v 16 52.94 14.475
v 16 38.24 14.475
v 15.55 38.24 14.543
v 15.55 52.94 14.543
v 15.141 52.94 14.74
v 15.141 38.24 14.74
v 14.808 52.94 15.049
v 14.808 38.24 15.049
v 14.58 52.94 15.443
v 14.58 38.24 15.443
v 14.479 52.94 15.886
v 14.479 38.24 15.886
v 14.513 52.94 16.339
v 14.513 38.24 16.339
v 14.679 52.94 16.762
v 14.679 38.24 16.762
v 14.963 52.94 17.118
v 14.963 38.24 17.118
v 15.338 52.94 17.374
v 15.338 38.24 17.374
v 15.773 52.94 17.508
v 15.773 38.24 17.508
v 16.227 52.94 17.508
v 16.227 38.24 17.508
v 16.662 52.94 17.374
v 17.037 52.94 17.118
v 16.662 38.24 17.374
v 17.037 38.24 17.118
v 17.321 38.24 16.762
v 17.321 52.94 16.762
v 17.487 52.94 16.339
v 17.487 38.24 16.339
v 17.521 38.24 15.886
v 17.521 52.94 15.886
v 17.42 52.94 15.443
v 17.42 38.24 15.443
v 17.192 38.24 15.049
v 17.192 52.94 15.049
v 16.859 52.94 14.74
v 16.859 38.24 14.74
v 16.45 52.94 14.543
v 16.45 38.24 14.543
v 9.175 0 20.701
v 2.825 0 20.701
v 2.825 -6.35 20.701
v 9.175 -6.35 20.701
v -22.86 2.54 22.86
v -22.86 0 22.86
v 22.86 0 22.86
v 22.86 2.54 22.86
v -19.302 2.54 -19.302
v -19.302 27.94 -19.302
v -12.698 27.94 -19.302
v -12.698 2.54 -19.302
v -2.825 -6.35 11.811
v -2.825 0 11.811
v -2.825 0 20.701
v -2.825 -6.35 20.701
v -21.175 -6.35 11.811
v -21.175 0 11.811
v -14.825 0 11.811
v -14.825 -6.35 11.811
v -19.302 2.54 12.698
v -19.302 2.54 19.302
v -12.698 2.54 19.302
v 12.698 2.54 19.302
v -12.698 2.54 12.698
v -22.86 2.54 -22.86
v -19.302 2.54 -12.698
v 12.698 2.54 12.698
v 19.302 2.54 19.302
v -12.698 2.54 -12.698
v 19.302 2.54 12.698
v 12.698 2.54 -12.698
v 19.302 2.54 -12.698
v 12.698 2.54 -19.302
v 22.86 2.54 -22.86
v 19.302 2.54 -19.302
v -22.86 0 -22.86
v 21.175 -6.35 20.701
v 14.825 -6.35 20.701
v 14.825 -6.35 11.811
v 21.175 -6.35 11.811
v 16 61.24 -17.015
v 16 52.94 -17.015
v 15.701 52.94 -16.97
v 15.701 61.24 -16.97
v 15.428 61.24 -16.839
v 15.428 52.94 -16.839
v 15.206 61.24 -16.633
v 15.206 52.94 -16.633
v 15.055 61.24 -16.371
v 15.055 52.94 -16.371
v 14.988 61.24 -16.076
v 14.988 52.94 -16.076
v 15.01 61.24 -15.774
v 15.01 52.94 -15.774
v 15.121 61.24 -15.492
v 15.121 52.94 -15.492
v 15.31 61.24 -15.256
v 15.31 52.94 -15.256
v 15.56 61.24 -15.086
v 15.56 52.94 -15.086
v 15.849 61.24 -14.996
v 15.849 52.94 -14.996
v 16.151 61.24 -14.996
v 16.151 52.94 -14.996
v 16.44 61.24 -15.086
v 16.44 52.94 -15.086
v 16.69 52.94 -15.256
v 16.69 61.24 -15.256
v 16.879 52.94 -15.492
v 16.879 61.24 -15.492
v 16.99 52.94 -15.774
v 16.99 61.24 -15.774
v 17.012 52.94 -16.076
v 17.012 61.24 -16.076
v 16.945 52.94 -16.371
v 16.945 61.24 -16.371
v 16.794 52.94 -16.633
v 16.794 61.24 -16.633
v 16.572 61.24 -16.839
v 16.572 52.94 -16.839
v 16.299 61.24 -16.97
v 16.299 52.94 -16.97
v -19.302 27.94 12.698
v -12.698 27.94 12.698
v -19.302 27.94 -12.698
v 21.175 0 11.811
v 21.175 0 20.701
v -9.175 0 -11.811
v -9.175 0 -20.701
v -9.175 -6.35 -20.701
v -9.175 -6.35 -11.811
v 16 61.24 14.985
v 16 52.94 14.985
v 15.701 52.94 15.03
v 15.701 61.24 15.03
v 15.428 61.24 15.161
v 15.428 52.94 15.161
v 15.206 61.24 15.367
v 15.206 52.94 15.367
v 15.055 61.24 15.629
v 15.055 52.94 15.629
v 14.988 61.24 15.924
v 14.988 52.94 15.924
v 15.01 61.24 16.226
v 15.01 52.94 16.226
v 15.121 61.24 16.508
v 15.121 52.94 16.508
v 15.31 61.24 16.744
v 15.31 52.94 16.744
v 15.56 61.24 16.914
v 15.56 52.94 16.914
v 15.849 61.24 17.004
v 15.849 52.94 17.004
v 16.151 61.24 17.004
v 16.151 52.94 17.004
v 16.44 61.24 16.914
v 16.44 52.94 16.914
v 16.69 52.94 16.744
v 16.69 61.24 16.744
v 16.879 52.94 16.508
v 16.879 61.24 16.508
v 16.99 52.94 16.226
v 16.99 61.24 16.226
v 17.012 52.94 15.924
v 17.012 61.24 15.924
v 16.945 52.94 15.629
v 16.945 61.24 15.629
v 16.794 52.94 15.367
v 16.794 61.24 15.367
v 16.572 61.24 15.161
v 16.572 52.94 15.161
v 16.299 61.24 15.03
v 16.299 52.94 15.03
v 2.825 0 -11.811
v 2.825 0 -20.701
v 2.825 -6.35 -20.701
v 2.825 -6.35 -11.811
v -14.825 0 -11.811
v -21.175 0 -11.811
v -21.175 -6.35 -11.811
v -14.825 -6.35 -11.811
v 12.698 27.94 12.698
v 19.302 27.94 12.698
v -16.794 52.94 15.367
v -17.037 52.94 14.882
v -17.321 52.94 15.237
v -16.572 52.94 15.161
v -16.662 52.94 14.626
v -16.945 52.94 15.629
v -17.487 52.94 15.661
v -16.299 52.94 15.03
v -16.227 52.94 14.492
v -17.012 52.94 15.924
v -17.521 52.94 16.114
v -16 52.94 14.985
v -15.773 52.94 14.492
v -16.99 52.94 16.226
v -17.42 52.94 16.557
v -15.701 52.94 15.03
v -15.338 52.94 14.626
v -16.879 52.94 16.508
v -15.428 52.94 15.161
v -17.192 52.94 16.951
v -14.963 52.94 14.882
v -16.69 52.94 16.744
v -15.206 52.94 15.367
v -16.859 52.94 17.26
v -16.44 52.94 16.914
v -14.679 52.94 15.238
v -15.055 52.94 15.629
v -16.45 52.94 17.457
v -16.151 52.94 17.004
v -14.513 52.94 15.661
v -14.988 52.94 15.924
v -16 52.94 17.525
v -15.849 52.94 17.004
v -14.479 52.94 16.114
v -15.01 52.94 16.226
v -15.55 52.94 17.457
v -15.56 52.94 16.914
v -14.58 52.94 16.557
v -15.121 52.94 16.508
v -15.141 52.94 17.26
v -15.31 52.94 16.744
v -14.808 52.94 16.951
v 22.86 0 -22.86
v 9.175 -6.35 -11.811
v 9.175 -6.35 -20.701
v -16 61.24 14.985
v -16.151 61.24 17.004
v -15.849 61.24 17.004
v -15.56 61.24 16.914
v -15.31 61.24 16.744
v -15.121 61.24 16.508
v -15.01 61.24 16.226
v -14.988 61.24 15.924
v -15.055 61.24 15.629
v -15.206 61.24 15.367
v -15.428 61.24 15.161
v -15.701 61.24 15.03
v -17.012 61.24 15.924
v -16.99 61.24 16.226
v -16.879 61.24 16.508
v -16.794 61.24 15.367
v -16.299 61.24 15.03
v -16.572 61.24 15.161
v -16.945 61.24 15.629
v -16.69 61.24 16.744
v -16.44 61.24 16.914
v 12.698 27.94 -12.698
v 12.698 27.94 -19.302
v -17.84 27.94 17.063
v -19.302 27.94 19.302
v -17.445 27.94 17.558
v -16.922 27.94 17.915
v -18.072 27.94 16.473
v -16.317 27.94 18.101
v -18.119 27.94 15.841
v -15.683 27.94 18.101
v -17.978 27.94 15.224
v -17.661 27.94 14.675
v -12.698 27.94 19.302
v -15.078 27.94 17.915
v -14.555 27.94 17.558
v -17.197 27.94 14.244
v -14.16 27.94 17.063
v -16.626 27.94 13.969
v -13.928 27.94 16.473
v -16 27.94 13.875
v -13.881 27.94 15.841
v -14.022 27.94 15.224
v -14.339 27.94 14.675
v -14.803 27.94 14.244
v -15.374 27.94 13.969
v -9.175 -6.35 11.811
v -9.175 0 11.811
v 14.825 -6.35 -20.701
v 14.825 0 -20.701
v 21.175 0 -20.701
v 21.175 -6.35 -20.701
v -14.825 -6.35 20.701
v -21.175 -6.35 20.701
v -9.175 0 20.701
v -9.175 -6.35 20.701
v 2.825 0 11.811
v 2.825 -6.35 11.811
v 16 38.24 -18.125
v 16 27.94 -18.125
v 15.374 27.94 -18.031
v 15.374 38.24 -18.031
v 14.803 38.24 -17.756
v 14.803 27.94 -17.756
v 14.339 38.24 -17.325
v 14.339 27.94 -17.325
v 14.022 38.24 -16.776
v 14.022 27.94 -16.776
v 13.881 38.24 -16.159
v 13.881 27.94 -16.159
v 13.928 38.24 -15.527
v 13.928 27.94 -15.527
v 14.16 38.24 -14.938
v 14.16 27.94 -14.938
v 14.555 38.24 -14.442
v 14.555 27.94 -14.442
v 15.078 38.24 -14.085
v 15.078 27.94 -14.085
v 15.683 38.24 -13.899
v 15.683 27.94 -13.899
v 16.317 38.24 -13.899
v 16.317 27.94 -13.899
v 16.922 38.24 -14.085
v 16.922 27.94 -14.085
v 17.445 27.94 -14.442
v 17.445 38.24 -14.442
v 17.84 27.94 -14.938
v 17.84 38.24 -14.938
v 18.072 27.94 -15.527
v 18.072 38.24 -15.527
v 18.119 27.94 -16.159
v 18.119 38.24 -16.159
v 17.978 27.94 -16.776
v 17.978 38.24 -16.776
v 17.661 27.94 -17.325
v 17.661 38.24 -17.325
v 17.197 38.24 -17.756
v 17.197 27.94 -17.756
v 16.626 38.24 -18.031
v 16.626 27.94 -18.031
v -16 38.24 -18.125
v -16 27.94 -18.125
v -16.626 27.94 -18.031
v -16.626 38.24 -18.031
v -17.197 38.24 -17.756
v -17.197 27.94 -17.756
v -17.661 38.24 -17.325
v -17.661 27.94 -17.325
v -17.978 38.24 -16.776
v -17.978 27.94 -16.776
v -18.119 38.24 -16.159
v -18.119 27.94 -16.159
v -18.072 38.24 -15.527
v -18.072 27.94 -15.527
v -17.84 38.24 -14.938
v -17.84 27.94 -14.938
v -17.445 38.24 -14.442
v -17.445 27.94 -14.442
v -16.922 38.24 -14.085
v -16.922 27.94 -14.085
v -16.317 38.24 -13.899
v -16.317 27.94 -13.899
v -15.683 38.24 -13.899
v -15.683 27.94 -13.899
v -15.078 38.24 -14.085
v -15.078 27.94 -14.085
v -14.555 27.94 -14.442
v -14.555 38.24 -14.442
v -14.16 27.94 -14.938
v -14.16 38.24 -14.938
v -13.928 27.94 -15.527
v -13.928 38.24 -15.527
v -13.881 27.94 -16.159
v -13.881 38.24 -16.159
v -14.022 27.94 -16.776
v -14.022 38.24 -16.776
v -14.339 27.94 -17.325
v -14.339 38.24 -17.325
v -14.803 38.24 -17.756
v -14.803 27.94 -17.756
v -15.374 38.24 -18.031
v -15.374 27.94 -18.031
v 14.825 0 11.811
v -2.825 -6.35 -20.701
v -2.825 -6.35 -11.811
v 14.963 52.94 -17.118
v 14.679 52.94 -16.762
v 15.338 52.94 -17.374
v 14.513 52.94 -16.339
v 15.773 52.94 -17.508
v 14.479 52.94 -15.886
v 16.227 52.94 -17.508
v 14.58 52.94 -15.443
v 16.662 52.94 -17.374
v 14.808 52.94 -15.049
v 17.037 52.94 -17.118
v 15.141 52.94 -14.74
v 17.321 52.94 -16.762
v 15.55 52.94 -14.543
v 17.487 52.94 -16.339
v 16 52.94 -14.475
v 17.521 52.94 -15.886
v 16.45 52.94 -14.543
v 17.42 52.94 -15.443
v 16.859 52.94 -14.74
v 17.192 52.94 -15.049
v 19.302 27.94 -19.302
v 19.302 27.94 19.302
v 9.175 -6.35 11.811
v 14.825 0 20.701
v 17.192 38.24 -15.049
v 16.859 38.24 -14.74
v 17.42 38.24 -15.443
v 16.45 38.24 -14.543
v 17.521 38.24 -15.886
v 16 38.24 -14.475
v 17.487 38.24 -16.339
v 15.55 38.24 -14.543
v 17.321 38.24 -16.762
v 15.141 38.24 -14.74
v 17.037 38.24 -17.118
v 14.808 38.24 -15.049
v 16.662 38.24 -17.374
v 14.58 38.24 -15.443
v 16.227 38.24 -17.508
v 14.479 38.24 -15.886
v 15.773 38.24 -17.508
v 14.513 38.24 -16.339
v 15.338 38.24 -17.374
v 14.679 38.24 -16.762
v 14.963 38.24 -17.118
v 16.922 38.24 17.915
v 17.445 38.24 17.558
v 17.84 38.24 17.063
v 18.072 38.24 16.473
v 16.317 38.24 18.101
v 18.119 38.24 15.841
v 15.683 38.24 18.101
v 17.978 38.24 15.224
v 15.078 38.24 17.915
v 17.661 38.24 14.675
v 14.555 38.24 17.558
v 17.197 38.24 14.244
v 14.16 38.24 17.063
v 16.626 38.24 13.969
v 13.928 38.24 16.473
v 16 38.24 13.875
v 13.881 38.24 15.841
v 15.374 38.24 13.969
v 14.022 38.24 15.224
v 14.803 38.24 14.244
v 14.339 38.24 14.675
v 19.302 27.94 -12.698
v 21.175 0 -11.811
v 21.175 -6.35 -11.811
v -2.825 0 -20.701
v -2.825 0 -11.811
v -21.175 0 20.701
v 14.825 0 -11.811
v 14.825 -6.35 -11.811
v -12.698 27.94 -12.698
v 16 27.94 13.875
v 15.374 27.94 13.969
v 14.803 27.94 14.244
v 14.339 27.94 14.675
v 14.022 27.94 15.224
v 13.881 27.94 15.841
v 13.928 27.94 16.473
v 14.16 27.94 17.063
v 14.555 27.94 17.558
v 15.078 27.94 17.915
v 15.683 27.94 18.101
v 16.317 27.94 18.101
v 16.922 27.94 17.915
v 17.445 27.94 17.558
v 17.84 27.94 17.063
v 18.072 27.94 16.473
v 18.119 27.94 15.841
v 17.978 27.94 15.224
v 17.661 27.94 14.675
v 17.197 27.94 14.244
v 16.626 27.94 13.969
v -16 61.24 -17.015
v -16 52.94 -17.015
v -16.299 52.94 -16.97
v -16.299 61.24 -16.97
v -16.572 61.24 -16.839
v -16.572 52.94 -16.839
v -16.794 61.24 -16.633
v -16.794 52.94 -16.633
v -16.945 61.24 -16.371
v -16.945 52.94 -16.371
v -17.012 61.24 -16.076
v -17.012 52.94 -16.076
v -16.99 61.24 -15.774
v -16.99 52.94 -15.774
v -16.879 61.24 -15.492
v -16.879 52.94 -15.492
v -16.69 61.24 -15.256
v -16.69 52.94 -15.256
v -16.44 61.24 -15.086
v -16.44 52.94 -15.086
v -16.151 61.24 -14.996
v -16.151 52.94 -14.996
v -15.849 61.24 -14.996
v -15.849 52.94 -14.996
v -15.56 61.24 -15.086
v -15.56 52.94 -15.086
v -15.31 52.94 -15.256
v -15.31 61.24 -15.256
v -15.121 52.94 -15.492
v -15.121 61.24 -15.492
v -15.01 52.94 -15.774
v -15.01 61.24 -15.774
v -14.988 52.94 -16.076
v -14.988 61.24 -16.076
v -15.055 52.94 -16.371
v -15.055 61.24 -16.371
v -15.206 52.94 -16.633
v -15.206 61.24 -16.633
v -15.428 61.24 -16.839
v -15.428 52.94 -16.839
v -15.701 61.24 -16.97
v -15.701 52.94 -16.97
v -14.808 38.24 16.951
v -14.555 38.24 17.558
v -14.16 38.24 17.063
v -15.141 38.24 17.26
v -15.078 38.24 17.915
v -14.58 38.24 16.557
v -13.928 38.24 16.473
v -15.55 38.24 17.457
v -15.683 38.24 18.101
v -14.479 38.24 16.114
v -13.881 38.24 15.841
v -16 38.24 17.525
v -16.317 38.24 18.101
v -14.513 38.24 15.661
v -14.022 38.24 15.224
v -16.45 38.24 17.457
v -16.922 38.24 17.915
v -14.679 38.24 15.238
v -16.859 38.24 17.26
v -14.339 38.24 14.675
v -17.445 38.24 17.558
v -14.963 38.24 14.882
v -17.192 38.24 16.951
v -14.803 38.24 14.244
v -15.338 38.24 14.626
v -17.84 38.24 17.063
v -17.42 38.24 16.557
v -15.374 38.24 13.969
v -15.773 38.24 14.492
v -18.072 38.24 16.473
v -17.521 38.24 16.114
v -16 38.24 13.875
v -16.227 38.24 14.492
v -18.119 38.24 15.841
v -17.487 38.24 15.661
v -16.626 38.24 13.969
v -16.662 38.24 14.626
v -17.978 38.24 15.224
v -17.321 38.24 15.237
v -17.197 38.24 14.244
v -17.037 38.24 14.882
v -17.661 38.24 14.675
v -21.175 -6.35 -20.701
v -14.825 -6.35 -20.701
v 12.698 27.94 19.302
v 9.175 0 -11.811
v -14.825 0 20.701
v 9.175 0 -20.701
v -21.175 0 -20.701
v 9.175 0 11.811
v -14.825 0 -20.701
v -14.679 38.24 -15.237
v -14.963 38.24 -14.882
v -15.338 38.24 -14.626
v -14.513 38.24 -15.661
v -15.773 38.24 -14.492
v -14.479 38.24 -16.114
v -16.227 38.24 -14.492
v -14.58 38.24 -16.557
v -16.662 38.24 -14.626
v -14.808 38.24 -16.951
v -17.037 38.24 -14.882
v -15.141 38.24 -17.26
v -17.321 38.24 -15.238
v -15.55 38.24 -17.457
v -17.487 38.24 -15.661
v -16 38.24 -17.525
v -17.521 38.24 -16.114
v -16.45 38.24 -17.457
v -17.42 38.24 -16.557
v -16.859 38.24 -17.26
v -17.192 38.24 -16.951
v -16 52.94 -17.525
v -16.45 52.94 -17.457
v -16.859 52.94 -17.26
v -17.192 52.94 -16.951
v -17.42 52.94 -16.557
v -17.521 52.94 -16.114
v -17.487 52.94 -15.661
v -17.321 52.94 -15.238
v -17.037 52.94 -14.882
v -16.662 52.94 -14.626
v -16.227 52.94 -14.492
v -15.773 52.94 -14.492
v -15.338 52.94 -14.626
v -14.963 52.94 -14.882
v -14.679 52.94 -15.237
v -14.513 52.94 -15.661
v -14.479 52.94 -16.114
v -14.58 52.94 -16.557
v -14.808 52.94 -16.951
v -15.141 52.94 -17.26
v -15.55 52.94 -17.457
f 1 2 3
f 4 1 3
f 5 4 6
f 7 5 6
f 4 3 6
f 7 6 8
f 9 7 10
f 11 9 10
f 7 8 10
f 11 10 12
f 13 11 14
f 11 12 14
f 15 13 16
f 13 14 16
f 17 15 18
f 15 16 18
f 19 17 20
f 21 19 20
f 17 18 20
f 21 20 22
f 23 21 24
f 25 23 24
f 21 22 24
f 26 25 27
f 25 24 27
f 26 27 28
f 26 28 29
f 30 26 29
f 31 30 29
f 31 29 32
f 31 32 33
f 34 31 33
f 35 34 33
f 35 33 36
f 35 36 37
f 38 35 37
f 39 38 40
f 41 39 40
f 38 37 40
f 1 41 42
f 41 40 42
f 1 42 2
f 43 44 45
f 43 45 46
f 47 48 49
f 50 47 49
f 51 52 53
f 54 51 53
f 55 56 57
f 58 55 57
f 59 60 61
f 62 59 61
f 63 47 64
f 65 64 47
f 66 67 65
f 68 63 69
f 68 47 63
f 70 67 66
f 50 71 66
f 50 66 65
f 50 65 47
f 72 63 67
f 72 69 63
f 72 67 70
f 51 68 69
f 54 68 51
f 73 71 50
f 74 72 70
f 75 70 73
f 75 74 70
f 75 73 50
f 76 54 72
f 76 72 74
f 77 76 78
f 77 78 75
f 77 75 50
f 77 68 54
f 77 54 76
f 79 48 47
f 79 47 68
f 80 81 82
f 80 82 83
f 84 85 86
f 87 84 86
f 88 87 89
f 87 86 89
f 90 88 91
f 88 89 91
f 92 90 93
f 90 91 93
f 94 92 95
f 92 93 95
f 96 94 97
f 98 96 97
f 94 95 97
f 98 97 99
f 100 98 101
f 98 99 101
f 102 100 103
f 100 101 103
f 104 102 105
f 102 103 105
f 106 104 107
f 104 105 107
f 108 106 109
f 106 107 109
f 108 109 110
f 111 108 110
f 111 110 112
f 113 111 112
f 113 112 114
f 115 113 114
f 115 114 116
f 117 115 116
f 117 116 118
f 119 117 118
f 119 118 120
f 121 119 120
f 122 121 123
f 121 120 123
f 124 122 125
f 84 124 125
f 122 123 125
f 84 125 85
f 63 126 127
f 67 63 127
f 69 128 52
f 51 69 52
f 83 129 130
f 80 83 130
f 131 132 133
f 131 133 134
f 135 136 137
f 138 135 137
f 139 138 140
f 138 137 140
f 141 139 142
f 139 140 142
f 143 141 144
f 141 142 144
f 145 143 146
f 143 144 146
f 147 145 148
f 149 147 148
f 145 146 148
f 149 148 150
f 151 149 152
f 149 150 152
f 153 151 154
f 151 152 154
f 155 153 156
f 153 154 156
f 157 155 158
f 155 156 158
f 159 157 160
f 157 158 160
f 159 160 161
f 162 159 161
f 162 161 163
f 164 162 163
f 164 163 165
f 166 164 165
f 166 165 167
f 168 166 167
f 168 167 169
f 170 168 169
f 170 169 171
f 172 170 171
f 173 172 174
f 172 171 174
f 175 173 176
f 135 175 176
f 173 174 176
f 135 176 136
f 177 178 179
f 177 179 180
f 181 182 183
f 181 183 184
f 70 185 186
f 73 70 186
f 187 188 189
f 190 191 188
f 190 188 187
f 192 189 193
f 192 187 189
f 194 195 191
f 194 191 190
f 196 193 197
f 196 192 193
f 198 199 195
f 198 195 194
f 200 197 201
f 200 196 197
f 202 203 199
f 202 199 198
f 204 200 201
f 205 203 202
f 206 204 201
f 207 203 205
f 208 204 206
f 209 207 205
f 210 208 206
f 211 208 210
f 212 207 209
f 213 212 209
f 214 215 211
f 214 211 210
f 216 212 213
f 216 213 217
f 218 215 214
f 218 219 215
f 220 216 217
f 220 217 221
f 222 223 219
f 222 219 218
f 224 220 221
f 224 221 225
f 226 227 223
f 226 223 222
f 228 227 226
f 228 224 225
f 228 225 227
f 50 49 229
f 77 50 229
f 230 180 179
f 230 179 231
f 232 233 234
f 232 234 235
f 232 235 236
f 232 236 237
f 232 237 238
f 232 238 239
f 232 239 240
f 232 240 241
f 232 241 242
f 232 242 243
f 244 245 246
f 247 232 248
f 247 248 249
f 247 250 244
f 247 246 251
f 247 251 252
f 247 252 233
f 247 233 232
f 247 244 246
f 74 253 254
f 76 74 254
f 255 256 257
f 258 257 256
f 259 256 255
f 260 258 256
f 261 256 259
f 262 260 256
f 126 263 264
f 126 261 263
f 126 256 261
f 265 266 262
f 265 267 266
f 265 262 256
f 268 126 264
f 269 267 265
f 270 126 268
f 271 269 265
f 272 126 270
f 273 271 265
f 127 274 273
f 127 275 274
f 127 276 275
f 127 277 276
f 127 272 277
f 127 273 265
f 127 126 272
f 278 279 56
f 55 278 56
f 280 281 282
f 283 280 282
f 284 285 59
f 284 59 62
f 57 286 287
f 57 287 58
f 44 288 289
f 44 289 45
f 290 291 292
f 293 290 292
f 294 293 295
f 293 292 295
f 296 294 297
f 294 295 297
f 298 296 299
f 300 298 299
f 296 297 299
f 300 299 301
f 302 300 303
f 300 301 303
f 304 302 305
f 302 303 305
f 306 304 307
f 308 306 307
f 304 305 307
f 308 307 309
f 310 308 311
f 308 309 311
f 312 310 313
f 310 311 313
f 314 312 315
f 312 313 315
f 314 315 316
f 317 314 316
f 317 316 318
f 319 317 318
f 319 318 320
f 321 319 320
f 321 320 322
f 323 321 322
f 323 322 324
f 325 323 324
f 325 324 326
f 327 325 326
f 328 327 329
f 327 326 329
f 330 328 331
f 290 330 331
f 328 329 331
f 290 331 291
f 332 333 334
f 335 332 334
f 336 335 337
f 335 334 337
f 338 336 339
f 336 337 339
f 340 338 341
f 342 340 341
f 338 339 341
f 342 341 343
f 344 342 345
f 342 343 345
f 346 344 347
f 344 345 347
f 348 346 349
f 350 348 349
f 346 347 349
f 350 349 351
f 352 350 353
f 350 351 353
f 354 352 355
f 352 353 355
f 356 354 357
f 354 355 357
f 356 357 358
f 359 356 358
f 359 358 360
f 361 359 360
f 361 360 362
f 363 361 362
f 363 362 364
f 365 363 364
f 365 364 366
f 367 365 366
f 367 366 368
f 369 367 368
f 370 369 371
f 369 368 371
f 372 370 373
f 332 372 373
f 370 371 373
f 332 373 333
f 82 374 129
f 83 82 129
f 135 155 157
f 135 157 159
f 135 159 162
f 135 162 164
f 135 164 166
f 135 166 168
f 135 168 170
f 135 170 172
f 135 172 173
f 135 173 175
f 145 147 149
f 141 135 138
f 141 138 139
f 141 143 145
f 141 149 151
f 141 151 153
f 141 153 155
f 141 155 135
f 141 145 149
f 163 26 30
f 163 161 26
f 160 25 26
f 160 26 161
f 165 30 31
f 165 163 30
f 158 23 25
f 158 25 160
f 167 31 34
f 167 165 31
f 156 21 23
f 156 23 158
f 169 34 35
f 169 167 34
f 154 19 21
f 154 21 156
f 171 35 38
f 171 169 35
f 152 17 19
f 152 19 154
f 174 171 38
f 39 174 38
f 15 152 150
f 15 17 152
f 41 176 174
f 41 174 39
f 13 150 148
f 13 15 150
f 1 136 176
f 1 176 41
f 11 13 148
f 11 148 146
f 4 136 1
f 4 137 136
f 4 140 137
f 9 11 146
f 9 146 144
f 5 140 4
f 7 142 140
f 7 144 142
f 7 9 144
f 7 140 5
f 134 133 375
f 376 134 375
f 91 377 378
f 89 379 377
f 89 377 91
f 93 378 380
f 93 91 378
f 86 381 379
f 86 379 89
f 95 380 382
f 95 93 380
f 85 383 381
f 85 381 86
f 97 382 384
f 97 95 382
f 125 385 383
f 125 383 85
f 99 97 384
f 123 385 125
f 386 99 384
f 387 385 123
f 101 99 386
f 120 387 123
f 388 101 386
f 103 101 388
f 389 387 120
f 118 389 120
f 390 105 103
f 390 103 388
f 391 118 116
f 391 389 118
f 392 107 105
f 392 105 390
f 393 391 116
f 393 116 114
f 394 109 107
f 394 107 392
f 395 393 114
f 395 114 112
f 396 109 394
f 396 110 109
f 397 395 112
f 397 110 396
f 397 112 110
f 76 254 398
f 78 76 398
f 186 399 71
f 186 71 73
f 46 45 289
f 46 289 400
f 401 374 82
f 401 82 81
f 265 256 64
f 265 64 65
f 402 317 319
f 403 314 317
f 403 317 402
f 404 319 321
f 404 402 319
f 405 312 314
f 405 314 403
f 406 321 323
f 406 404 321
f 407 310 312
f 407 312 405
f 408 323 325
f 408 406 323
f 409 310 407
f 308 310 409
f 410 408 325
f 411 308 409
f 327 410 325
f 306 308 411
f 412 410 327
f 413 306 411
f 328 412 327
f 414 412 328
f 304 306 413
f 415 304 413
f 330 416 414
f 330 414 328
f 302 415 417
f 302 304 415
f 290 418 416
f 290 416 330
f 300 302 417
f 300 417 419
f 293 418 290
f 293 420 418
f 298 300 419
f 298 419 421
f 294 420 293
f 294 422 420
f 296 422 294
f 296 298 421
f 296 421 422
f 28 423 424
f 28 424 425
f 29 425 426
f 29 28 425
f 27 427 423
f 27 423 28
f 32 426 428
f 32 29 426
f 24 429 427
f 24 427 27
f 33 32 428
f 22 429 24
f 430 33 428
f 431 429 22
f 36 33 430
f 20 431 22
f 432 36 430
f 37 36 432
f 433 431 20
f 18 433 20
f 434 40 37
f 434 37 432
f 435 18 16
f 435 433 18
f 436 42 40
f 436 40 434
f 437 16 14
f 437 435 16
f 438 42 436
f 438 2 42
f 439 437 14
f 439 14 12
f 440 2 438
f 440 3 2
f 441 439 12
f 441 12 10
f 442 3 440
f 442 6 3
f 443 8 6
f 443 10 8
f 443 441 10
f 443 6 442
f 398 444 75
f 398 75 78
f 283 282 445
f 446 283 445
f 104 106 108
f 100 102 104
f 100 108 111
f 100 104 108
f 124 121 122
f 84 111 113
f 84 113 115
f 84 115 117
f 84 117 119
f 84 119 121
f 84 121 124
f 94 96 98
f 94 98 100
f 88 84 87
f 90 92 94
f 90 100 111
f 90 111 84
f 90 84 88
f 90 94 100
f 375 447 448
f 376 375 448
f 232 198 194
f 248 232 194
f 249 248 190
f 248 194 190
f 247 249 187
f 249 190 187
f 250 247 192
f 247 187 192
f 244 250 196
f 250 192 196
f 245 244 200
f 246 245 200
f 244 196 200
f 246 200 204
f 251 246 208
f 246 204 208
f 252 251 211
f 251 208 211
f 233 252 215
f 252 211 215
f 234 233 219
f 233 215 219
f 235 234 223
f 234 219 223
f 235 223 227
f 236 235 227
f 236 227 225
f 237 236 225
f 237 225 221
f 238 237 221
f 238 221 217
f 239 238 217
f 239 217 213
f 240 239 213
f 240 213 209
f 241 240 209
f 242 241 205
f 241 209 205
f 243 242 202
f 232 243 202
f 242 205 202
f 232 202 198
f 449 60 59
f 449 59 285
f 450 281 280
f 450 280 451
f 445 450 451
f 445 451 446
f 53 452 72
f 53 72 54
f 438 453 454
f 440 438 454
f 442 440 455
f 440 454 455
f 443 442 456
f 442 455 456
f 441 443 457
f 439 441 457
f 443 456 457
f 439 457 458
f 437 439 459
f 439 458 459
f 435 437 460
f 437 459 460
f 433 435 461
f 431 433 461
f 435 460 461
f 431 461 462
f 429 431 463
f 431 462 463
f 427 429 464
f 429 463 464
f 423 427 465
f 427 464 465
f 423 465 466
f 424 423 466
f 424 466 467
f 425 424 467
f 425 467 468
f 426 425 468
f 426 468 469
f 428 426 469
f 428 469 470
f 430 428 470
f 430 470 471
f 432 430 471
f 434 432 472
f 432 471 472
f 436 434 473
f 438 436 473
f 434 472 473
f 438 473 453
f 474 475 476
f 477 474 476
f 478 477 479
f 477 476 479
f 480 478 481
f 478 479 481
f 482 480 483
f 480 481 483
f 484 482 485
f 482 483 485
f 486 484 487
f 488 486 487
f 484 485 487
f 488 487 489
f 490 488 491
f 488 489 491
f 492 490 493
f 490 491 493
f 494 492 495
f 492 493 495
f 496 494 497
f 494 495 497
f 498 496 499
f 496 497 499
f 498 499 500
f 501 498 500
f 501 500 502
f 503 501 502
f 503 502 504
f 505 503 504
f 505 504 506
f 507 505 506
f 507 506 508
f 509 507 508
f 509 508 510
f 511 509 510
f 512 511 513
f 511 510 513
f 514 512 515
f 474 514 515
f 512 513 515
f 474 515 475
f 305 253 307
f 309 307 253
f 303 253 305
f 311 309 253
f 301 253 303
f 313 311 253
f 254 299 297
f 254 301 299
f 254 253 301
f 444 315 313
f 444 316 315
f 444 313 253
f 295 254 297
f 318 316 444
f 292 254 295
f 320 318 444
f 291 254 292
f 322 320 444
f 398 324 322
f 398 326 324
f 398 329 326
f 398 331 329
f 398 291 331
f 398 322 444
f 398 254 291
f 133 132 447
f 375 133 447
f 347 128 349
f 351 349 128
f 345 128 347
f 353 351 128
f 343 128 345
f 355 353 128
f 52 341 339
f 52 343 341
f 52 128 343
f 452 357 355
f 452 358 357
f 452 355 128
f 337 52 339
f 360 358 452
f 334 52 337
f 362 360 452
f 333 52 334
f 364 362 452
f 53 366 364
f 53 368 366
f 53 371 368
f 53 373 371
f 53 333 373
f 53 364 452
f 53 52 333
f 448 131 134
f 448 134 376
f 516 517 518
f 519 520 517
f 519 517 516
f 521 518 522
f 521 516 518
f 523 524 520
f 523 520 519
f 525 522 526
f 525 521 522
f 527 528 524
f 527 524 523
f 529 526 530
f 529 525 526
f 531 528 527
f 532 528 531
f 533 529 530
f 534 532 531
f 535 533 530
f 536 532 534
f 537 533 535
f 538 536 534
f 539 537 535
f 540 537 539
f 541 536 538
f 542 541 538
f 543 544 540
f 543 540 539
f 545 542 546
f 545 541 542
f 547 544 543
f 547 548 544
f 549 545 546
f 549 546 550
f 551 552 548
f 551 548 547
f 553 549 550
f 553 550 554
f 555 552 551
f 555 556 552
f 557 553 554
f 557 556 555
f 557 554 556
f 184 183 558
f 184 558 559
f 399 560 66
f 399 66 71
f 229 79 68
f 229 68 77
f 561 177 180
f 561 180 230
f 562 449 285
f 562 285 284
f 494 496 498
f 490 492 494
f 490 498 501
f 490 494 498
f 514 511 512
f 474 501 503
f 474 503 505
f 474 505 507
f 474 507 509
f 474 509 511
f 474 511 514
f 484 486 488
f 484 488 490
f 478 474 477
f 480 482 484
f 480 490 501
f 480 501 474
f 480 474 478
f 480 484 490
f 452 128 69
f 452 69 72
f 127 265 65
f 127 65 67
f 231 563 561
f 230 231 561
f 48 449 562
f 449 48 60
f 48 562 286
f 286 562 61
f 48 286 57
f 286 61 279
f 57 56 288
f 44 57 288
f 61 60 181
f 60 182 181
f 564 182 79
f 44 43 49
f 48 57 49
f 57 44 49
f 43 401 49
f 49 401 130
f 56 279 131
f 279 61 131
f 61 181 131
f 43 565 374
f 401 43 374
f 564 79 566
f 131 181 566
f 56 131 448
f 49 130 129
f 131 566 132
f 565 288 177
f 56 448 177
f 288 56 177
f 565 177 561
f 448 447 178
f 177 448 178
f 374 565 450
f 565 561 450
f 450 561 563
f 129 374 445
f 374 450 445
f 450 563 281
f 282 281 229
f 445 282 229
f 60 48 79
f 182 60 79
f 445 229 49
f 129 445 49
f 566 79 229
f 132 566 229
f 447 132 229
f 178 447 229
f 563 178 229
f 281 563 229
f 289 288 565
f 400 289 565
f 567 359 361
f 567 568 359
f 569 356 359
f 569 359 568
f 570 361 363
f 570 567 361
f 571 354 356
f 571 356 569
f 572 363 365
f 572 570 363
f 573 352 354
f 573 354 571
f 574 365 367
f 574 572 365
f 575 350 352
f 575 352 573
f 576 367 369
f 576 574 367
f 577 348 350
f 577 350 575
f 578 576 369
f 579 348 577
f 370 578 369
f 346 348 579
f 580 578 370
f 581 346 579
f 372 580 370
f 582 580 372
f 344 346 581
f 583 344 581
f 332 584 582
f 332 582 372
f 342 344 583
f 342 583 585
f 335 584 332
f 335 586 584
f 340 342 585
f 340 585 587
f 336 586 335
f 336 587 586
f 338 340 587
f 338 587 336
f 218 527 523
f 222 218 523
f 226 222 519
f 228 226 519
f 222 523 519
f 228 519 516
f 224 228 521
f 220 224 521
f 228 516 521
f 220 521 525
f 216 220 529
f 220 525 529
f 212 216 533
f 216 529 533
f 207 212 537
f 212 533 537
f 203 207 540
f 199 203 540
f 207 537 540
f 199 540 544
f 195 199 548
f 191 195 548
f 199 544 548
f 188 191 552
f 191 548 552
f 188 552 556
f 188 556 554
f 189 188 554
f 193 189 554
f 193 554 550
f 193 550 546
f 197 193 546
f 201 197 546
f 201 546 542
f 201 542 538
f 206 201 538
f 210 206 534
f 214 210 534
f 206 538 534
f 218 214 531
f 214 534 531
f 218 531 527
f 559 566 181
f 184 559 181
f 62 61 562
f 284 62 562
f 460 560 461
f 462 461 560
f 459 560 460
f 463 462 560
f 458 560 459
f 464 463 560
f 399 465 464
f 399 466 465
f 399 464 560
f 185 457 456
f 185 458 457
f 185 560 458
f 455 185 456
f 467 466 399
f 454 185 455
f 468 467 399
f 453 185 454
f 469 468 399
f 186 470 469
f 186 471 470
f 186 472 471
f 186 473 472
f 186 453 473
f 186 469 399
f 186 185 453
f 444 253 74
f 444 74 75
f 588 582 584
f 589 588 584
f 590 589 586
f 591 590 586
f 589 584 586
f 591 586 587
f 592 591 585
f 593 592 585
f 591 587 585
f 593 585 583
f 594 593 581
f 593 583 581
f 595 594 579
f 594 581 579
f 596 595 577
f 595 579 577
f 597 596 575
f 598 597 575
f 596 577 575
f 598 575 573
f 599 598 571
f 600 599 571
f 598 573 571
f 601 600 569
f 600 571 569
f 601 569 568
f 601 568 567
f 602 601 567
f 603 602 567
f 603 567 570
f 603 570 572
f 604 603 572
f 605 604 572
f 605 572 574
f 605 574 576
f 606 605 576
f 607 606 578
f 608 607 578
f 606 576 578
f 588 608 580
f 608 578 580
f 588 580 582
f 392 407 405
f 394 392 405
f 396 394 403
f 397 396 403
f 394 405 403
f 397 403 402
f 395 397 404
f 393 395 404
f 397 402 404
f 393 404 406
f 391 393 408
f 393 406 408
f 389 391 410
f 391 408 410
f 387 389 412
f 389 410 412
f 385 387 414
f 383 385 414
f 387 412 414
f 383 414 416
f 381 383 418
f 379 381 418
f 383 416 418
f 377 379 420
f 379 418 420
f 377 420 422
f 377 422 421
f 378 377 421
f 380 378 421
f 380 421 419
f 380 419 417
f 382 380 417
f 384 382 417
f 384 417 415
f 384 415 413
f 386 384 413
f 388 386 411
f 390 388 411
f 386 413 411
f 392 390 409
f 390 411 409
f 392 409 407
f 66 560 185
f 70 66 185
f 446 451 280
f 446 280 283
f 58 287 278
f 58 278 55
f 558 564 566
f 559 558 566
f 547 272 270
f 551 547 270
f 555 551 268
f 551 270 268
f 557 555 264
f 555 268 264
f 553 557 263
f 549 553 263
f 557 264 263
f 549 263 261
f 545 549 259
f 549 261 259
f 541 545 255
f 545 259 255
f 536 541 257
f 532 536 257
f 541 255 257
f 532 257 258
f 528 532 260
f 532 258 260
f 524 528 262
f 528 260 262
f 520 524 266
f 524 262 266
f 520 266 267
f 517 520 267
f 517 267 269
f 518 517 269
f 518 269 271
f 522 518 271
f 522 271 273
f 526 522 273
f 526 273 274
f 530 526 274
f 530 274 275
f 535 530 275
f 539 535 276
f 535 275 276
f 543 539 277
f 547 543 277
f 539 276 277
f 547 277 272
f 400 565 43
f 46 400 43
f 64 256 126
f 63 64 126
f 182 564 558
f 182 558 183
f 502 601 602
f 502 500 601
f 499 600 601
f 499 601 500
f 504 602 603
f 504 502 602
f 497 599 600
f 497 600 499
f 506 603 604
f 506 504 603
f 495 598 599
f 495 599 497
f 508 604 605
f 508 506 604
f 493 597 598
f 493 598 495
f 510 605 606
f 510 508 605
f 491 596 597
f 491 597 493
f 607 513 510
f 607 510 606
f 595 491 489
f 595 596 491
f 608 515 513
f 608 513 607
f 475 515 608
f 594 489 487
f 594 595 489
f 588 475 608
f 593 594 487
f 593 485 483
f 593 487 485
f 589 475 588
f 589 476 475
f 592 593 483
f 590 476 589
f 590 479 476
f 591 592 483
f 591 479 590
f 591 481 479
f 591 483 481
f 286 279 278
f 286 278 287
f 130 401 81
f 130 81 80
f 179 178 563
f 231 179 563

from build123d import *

# Parameters (mm, degrees)
SKETCH1_W           = 45.72
SKETCH1_H           = 45.72
BOSS_EXTRUDE1_DEPTH = 2.54
SKETCH2_W           = 6.604
SKETCH2_H           = 6.604
BOSS_EXTRUDE2_DEPTH = 25.4
SKETCH5_R           = 2.125
BOSS_EXTRUDE5_DEPTH = 10.3
SKETCH8_R           = 1.525
BOSS_EXTRUDE8_DEPTH = 14.7
SKETCH9_R           = 1.015
BOSS_EXTRUDE9_DEPTH = 8.3
SKETCH7_W           = 6.35
SKETCH7_H           = 8.89
BOSS_EXTRUDE7_DEPTH = 6.35


with BuildPart() as part:
    # Sketch1 → Boss-Extrude1 (new body)
    with BuildSketch(Plane(origin=(0, 0, 0), x_dir=(1, 0, 0), z_dir=(0, 1, 0))):
        Rectangle(SKETCH1_W, SKETCH1_H)
    extrude(amount=BOSS_EXTRUDE1_DEPTH)

    # Sketch2 → Boss-Extrude2 (add)
    with BuildSketch(Plane(origin=(0, 2.54, 0), x_dir=(1, 0, 0), z_dir=(0, 1, 0))):
        with Locations((16.000000004, 16.000000004)):
            Rectangle(SKETCH2_W, SKETCH2_H)
        with Locations((-16.000000004, 16.000000004)):
            Rectangle(SKETCH2_W, SKETCH2_H)
        with Locations((-16.000000004, -16.000000004)):
            Rectangle(SKETCH2_W, SKETCH2_H)
        with Locations((16.000000004, -16.000000004)):
            Rectangle(SKETCH2_W, SKETCH2_H)
    extrude(amount=BOSS_EXTRUDE2_DEPTH)

    # Sketch5 → Boss-Extrude5 (add)
    with BuildSketch(Plane(origin=(0, 27.94, 0), x_dir=(1, 0, 0), z_dir=(0, 1, 0))):
        with Locations(Location((-16.000000004, 16.000000004, 0), (0, 0, 90))):
            Circle(SKETCH5_R)
        with Locations(Location((16.000000004, 16.000000004, 0), (0, 0, 90))):
            Circle(SKETCH5_R)
        with Locations(Location((-16.000000004, -16.000000004, 0), (0, 0, 90))):
            Circle(SKETCH5_R)
        with Locations(Location((16.000000004, -16.000000004, 0), (0, 0, 90))):
            Circle(SKETCH5_R)
    extrude(amount=BOSS_EXTRUDE5_DEPTH)

    # Sketch8 → Boss-Extrude8 (add)
    with BuildSketch(Plane(origin=(0, 38.24, 0), x_dir=(1, 0, 0), z_dir=(0, 1, 0))):
        with Locations(Location((16, 16, 0), (0, 0, 270))):
            Circle(SKETCH8_R)
        with Locations(Location((-16, 16, 0), (0, 0, 90))):
            Circle(SKETCH8_R)
        with Locations(Location((-16, -16, 0), (0, 0, 270))):
            Circle(SKETCH8_R)
        with Locations(Location((16, -16, 0), (0, 0, 90))):
            Circle(SKETCH8_R)
    extrude(amount=BOSS_EXTRUDE8_DEPTH)

    # Sketch9 → Boss-Extrude9 (add)
    with BuildSketch(Plane(origin=(0, 52.94, 0), x_dir=(1, 0, 0), z_dir=(0, 1, 0))):
        with Locations(Location((16, 16, 0), (0, 0, 90))):
            Circle(SKETCH9_R)
        with Locations(Location((-16, 16, 0), (0, 0, 90))):
            Circle(SKETCH9_R)
        with Locations(Location((-16, -16, 0), (0, 0, 90))):
            Circle(SKETCH9_R)
        with Locations(Location((16, -16, 0), (0, 0, 90))):
            Circle(SKETCH9_R)
    extrude(amount=BOSS_EXTRUDE9_DEPTH)

    # Sketch7 → Boss-Extrude7 (add)
    with BuildSketch(Plane.XZ):
        with Locations((-6, 16.256)):
            Rectangle(SKETCH7_W, SKETCH7_H)
        with Locations((-18, 16.256)):
            Rectangle(SKETCH7_W, SKETCH7_H)
        with Locations((6, 16.256)):
            Rectangle(SKETCH7_W, SKETCH7_H)
        with Locations((18, 16.256)):
            Rectangle(SKETCH7_W, SKETCH7_H)
        with Locations((-6, -16.256)):
            Rectangle(SKETCH7_W, SKETCH7_H)
        with Locations((-18, -16.256)):
            Rectangle(SKETCH7_W, SKETCH7_H)
        with Locations((18, -16.256)):
            Rectangle(SKETCH7_W, SKETCH7_H)
        with Locations((6, -16.256)):
            Rectangle(SKETCH7_W, SKETCH7_H)
    extrude(amount=BOSS_EXTRUDE7_DEPTH)


solid = part.part
